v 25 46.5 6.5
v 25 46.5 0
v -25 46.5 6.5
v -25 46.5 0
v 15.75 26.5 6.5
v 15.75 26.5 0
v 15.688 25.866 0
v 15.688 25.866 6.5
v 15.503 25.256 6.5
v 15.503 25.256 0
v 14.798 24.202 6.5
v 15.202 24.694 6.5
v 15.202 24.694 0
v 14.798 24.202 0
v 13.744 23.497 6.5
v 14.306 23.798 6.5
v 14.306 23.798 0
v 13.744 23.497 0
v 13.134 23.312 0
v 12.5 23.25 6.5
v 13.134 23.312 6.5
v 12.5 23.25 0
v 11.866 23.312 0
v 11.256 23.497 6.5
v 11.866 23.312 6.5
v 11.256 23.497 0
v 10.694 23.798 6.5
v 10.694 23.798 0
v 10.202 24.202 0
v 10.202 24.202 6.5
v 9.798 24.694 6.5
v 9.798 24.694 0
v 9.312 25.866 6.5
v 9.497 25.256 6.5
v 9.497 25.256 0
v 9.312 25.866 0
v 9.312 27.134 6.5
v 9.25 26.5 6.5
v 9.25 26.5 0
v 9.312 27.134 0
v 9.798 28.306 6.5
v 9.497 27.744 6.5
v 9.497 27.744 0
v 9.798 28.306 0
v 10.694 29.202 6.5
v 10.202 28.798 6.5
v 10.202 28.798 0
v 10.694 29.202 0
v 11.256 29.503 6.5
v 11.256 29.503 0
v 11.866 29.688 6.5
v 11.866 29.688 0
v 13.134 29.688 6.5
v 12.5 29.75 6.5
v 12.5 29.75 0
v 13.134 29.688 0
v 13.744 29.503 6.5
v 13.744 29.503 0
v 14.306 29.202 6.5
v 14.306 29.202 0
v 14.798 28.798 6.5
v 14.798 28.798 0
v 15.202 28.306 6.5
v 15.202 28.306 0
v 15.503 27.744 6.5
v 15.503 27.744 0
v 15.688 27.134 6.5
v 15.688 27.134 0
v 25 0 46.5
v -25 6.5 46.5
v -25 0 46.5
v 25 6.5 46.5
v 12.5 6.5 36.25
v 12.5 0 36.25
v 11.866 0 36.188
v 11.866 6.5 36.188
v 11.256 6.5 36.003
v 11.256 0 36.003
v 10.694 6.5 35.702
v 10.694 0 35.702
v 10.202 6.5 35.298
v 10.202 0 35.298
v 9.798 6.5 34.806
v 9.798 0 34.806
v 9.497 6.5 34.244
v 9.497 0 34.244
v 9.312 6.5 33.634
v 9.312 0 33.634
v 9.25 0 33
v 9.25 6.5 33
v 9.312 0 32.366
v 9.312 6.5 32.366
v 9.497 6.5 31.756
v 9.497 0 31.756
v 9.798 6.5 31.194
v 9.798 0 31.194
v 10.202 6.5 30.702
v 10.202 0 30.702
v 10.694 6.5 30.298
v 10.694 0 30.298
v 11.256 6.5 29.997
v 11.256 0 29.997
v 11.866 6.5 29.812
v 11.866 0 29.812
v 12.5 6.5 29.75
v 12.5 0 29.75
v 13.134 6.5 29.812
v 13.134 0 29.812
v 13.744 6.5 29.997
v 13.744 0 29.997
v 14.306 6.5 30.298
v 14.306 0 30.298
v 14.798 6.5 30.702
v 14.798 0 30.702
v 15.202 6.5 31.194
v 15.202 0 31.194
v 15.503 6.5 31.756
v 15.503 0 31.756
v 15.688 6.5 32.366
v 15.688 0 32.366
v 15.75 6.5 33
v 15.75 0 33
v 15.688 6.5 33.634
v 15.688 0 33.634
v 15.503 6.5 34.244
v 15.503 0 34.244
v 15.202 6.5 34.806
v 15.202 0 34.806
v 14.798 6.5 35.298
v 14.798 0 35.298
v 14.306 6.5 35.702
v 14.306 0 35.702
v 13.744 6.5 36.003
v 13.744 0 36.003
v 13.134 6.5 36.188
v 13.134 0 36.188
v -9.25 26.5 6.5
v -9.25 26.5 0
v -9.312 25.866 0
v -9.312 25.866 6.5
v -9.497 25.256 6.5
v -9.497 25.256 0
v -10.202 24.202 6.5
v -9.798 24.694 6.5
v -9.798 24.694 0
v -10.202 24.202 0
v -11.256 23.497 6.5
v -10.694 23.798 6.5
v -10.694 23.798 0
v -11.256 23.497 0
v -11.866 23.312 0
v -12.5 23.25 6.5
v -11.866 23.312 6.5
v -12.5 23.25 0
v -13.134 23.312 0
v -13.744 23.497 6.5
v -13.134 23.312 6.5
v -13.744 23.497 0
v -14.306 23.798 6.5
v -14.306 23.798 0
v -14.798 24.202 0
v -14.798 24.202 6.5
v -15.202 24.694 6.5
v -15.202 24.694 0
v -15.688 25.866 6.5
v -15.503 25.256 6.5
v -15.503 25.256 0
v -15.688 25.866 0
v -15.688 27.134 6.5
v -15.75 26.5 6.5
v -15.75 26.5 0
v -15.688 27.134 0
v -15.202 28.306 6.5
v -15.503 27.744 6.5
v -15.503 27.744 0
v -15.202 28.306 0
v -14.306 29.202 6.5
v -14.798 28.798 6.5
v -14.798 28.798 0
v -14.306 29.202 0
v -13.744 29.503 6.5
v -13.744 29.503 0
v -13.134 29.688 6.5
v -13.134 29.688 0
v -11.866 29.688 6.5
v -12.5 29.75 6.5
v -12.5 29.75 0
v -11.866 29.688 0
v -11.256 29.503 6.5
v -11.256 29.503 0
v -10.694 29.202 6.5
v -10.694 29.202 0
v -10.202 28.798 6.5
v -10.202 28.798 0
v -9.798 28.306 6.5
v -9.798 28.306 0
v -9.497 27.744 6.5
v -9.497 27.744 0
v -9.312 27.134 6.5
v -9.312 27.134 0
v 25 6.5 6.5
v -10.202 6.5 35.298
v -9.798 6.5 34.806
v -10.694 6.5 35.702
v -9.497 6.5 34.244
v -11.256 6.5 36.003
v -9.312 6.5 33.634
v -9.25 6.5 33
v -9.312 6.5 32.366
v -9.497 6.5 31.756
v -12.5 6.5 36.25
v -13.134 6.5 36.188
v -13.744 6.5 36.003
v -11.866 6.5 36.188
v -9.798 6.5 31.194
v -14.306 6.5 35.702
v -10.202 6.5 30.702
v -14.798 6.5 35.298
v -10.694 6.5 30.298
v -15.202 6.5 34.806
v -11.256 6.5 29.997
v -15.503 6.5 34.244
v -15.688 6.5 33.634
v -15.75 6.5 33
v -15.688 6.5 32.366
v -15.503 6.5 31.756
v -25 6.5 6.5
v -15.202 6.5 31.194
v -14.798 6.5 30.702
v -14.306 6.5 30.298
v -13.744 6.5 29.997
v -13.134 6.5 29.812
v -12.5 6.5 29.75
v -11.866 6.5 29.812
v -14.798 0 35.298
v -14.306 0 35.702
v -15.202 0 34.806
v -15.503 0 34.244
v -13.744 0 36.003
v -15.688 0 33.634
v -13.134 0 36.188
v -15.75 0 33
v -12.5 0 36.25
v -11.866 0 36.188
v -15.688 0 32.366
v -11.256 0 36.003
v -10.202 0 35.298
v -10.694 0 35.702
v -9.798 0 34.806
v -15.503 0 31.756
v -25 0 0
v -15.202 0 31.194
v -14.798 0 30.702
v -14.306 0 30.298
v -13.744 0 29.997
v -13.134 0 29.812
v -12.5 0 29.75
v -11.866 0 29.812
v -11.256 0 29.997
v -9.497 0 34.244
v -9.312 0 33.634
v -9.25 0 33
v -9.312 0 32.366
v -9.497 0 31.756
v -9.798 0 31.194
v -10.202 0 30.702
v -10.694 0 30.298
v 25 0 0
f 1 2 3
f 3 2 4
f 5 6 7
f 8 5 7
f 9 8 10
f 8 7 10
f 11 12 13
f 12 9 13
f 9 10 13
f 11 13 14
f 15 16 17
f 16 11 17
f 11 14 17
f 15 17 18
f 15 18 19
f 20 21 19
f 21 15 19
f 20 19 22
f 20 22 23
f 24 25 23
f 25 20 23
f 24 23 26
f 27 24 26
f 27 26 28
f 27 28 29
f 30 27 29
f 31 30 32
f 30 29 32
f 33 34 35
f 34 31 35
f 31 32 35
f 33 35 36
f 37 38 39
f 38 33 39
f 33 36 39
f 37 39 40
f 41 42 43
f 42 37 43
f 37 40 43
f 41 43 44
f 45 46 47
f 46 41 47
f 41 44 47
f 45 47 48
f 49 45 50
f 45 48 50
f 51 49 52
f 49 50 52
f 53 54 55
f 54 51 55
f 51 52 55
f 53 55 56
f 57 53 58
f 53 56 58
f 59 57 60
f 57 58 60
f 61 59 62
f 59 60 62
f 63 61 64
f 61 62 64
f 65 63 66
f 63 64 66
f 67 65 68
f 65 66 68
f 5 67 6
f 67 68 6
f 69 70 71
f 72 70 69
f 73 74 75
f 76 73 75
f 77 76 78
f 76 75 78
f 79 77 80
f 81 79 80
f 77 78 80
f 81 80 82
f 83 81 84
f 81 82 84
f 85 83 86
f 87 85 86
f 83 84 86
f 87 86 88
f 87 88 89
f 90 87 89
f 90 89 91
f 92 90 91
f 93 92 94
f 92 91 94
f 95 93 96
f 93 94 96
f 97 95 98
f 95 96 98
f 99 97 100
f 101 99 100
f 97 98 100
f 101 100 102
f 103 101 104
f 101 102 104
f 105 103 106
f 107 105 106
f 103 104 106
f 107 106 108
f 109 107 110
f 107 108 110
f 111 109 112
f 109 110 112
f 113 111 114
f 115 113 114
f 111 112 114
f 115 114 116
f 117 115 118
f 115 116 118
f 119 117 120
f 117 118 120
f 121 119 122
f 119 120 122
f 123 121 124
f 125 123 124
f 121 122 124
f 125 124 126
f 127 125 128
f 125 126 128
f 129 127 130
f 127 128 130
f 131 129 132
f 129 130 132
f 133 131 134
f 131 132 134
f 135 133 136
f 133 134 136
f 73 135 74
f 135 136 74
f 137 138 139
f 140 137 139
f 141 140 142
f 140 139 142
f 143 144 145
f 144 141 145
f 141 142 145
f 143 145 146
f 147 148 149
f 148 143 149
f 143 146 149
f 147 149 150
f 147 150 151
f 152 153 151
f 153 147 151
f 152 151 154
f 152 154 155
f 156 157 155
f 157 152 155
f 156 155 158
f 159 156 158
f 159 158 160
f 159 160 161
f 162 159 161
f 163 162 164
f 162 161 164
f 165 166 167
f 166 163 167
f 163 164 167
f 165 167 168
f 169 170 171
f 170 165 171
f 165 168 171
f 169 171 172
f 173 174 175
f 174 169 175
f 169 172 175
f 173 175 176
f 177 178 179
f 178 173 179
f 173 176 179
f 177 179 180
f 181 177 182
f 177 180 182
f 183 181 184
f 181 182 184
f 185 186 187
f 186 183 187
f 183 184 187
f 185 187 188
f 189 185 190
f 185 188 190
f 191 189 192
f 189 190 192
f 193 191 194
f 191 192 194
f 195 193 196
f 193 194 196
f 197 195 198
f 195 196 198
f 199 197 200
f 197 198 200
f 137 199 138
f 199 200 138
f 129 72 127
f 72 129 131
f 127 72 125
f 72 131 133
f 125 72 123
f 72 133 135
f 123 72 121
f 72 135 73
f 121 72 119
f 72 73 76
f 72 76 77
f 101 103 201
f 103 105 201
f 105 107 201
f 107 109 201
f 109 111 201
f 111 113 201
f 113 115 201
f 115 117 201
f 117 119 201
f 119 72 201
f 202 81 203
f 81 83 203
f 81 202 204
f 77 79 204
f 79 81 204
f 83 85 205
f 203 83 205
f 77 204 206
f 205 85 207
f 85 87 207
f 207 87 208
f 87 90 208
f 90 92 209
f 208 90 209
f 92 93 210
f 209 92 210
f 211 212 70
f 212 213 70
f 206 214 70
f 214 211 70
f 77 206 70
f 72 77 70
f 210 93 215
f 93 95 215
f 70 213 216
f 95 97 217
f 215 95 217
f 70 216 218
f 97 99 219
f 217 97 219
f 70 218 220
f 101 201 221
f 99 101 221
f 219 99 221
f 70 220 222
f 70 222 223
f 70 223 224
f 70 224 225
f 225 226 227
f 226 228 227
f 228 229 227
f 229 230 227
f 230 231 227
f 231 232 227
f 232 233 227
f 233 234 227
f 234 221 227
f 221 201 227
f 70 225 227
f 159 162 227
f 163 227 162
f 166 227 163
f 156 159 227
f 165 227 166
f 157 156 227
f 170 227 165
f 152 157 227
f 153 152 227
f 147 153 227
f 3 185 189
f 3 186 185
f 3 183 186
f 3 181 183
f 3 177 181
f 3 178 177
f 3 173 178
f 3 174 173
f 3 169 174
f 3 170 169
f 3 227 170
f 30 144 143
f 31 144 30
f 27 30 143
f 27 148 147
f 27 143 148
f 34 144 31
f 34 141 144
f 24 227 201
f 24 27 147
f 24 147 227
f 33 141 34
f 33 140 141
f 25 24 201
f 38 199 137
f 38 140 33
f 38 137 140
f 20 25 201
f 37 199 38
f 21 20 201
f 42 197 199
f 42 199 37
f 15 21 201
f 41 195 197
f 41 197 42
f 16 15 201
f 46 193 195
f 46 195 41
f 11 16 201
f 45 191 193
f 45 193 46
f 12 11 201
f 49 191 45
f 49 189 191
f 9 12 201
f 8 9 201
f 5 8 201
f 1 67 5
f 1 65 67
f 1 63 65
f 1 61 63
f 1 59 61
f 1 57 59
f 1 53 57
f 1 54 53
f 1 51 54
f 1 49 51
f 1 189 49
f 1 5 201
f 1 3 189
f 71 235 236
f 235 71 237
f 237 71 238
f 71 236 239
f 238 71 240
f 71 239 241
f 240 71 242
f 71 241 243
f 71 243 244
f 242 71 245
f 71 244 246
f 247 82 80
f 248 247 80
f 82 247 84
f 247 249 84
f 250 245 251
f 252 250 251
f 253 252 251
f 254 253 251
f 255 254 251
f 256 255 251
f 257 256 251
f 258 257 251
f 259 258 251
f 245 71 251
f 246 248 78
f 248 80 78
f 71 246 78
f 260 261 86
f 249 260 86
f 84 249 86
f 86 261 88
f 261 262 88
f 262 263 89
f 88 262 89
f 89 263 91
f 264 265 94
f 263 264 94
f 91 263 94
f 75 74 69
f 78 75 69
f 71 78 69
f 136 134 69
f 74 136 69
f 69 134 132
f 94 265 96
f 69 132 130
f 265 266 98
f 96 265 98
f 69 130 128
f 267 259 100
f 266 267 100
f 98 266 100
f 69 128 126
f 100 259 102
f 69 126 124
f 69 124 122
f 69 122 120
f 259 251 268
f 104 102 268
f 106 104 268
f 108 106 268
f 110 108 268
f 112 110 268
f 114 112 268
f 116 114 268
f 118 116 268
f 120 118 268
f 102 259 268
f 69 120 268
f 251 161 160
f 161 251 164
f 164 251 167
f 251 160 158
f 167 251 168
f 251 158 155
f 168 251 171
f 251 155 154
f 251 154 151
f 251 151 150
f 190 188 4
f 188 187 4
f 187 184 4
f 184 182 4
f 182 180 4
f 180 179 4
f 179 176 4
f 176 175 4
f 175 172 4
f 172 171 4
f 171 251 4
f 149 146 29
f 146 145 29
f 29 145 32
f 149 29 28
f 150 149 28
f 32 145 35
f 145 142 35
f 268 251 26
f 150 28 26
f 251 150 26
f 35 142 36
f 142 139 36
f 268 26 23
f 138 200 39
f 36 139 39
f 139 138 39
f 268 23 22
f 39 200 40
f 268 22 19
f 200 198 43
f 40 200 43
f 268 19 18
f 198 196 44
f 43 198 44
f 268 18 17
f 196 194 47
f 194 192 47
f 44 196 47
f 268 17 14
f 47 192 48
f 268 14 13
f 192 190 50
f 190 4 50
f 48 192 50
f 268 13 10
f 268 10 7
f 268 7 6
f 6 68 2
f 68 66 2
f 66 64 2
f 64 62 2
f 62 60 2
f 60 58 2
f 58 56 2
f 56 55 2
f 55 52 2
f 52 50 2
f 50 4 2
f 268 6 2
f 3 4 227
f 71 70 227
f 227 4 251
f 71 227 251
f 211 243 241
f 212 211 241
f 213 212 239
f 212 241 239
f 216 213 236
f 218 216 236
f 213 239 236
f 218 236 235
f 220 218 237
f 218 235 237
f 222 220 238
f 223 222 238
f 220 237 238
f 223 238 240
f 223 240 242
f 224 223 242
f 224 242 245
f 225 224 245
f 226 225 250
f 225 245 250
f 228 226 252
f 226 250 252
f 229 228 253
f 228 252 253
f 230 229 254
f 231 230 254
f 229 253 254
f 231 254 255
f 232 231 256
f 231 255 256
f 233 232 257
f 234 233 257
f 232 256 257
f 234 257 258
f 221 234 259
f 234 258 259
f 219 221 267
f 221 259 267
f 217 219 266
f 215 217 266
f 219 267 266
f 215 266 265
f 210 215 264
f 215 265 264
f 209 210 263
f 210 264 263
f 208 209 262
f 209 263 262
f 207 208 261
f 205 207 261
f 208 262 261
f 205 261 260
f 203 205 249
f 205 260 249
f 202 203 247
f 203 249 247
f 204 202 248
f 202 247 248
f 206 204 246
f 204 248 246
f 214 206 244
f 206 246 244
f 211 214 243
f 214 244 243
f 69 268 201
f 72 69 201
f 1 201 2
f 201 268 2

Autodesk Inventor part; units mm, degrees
ref_plane "YZ Plane" through (0, 0, 0) normal (1, 0, 0) x (0, 1, 0)
ref_plane "XZ Plane" through (0, 0, 0) normal (0, 1, 0) x (-1, 0, 0)
ref_plane "XY Plane" through (0, 0, 0) normal (0, 0, 1) x (1, 0, 0)
sketch "Sketch1" plane through (0, 0, 0) normal (0, 0, 1) x (1, 0, 0)
  line L0 (-25, 0) -> (25, 0)
  line L1 (25, 0) -> (25, 46.5)
  line L2 (25, 46.5) -> (-25, 46.5)
  line L3 (-25, 46.5) -> (-25, 0)
  circle A0 centre (-12.5, 26.5) radius 3.25
  circle A1 centre (12.5, 26.5) radius 3.25
  point P0 (0, 0)
  dimension "d0" = 50
  dimension "d1" = 46.5
  dimension "d2" = 6.5
  dimension "d3" = 6.5
extrude "Extrusion1" add sketch "Sketch1" along normal blind 6.5
sketch "Sketch2" plane through (0, 0, 6.5) normal (0, 0, 1) x (1, 0, 0)
  line L0 (-25, 0) -> (25, 0)
  line L1 (25, 0) -> (25, 6.5)
  line L2 (25, 6.5) -> (-25, 6.5)
  line L3 (-25, 6.5) -> (-25, 0)
  point P0 (0, 0)
  dimension "d6" = 50
  dimension "d7" = 6.5
extrude "Extrusion2" add sketch "Sketch2" along normal blind 40
sketch "Sketch3" plane through (-25, 6.5, 6.5) normal (0, 1, 0) x (1, 0, 0)
  circle A0 centre (12.5, -26.5) radius 3.25
  circle A1 centre (37.5, -26.5) radius 3.25
  point P0 (25, 6.5)
  dimension "d10" = 6.5
  dimension "d11" = 6.5
hole "Hole1" at (-12.5, 6.5, 33) direction (0, -1, 0) diameter 6.5 end through all
sketch "Sketch4" plane through (-25, 6.5, 6.5) normal (0, 1, 0) x (1, 0, 0)
  circle A0 centre (37.5, -26.5) radius 3.25
  point P0 (25, 6.5)
  dimension "d19" = 6.5
hole "Hole2" at (12.5, 6.5, 33) direction (0, -1, 0) diameter 6.5 end through all
properties part number "Angle"
